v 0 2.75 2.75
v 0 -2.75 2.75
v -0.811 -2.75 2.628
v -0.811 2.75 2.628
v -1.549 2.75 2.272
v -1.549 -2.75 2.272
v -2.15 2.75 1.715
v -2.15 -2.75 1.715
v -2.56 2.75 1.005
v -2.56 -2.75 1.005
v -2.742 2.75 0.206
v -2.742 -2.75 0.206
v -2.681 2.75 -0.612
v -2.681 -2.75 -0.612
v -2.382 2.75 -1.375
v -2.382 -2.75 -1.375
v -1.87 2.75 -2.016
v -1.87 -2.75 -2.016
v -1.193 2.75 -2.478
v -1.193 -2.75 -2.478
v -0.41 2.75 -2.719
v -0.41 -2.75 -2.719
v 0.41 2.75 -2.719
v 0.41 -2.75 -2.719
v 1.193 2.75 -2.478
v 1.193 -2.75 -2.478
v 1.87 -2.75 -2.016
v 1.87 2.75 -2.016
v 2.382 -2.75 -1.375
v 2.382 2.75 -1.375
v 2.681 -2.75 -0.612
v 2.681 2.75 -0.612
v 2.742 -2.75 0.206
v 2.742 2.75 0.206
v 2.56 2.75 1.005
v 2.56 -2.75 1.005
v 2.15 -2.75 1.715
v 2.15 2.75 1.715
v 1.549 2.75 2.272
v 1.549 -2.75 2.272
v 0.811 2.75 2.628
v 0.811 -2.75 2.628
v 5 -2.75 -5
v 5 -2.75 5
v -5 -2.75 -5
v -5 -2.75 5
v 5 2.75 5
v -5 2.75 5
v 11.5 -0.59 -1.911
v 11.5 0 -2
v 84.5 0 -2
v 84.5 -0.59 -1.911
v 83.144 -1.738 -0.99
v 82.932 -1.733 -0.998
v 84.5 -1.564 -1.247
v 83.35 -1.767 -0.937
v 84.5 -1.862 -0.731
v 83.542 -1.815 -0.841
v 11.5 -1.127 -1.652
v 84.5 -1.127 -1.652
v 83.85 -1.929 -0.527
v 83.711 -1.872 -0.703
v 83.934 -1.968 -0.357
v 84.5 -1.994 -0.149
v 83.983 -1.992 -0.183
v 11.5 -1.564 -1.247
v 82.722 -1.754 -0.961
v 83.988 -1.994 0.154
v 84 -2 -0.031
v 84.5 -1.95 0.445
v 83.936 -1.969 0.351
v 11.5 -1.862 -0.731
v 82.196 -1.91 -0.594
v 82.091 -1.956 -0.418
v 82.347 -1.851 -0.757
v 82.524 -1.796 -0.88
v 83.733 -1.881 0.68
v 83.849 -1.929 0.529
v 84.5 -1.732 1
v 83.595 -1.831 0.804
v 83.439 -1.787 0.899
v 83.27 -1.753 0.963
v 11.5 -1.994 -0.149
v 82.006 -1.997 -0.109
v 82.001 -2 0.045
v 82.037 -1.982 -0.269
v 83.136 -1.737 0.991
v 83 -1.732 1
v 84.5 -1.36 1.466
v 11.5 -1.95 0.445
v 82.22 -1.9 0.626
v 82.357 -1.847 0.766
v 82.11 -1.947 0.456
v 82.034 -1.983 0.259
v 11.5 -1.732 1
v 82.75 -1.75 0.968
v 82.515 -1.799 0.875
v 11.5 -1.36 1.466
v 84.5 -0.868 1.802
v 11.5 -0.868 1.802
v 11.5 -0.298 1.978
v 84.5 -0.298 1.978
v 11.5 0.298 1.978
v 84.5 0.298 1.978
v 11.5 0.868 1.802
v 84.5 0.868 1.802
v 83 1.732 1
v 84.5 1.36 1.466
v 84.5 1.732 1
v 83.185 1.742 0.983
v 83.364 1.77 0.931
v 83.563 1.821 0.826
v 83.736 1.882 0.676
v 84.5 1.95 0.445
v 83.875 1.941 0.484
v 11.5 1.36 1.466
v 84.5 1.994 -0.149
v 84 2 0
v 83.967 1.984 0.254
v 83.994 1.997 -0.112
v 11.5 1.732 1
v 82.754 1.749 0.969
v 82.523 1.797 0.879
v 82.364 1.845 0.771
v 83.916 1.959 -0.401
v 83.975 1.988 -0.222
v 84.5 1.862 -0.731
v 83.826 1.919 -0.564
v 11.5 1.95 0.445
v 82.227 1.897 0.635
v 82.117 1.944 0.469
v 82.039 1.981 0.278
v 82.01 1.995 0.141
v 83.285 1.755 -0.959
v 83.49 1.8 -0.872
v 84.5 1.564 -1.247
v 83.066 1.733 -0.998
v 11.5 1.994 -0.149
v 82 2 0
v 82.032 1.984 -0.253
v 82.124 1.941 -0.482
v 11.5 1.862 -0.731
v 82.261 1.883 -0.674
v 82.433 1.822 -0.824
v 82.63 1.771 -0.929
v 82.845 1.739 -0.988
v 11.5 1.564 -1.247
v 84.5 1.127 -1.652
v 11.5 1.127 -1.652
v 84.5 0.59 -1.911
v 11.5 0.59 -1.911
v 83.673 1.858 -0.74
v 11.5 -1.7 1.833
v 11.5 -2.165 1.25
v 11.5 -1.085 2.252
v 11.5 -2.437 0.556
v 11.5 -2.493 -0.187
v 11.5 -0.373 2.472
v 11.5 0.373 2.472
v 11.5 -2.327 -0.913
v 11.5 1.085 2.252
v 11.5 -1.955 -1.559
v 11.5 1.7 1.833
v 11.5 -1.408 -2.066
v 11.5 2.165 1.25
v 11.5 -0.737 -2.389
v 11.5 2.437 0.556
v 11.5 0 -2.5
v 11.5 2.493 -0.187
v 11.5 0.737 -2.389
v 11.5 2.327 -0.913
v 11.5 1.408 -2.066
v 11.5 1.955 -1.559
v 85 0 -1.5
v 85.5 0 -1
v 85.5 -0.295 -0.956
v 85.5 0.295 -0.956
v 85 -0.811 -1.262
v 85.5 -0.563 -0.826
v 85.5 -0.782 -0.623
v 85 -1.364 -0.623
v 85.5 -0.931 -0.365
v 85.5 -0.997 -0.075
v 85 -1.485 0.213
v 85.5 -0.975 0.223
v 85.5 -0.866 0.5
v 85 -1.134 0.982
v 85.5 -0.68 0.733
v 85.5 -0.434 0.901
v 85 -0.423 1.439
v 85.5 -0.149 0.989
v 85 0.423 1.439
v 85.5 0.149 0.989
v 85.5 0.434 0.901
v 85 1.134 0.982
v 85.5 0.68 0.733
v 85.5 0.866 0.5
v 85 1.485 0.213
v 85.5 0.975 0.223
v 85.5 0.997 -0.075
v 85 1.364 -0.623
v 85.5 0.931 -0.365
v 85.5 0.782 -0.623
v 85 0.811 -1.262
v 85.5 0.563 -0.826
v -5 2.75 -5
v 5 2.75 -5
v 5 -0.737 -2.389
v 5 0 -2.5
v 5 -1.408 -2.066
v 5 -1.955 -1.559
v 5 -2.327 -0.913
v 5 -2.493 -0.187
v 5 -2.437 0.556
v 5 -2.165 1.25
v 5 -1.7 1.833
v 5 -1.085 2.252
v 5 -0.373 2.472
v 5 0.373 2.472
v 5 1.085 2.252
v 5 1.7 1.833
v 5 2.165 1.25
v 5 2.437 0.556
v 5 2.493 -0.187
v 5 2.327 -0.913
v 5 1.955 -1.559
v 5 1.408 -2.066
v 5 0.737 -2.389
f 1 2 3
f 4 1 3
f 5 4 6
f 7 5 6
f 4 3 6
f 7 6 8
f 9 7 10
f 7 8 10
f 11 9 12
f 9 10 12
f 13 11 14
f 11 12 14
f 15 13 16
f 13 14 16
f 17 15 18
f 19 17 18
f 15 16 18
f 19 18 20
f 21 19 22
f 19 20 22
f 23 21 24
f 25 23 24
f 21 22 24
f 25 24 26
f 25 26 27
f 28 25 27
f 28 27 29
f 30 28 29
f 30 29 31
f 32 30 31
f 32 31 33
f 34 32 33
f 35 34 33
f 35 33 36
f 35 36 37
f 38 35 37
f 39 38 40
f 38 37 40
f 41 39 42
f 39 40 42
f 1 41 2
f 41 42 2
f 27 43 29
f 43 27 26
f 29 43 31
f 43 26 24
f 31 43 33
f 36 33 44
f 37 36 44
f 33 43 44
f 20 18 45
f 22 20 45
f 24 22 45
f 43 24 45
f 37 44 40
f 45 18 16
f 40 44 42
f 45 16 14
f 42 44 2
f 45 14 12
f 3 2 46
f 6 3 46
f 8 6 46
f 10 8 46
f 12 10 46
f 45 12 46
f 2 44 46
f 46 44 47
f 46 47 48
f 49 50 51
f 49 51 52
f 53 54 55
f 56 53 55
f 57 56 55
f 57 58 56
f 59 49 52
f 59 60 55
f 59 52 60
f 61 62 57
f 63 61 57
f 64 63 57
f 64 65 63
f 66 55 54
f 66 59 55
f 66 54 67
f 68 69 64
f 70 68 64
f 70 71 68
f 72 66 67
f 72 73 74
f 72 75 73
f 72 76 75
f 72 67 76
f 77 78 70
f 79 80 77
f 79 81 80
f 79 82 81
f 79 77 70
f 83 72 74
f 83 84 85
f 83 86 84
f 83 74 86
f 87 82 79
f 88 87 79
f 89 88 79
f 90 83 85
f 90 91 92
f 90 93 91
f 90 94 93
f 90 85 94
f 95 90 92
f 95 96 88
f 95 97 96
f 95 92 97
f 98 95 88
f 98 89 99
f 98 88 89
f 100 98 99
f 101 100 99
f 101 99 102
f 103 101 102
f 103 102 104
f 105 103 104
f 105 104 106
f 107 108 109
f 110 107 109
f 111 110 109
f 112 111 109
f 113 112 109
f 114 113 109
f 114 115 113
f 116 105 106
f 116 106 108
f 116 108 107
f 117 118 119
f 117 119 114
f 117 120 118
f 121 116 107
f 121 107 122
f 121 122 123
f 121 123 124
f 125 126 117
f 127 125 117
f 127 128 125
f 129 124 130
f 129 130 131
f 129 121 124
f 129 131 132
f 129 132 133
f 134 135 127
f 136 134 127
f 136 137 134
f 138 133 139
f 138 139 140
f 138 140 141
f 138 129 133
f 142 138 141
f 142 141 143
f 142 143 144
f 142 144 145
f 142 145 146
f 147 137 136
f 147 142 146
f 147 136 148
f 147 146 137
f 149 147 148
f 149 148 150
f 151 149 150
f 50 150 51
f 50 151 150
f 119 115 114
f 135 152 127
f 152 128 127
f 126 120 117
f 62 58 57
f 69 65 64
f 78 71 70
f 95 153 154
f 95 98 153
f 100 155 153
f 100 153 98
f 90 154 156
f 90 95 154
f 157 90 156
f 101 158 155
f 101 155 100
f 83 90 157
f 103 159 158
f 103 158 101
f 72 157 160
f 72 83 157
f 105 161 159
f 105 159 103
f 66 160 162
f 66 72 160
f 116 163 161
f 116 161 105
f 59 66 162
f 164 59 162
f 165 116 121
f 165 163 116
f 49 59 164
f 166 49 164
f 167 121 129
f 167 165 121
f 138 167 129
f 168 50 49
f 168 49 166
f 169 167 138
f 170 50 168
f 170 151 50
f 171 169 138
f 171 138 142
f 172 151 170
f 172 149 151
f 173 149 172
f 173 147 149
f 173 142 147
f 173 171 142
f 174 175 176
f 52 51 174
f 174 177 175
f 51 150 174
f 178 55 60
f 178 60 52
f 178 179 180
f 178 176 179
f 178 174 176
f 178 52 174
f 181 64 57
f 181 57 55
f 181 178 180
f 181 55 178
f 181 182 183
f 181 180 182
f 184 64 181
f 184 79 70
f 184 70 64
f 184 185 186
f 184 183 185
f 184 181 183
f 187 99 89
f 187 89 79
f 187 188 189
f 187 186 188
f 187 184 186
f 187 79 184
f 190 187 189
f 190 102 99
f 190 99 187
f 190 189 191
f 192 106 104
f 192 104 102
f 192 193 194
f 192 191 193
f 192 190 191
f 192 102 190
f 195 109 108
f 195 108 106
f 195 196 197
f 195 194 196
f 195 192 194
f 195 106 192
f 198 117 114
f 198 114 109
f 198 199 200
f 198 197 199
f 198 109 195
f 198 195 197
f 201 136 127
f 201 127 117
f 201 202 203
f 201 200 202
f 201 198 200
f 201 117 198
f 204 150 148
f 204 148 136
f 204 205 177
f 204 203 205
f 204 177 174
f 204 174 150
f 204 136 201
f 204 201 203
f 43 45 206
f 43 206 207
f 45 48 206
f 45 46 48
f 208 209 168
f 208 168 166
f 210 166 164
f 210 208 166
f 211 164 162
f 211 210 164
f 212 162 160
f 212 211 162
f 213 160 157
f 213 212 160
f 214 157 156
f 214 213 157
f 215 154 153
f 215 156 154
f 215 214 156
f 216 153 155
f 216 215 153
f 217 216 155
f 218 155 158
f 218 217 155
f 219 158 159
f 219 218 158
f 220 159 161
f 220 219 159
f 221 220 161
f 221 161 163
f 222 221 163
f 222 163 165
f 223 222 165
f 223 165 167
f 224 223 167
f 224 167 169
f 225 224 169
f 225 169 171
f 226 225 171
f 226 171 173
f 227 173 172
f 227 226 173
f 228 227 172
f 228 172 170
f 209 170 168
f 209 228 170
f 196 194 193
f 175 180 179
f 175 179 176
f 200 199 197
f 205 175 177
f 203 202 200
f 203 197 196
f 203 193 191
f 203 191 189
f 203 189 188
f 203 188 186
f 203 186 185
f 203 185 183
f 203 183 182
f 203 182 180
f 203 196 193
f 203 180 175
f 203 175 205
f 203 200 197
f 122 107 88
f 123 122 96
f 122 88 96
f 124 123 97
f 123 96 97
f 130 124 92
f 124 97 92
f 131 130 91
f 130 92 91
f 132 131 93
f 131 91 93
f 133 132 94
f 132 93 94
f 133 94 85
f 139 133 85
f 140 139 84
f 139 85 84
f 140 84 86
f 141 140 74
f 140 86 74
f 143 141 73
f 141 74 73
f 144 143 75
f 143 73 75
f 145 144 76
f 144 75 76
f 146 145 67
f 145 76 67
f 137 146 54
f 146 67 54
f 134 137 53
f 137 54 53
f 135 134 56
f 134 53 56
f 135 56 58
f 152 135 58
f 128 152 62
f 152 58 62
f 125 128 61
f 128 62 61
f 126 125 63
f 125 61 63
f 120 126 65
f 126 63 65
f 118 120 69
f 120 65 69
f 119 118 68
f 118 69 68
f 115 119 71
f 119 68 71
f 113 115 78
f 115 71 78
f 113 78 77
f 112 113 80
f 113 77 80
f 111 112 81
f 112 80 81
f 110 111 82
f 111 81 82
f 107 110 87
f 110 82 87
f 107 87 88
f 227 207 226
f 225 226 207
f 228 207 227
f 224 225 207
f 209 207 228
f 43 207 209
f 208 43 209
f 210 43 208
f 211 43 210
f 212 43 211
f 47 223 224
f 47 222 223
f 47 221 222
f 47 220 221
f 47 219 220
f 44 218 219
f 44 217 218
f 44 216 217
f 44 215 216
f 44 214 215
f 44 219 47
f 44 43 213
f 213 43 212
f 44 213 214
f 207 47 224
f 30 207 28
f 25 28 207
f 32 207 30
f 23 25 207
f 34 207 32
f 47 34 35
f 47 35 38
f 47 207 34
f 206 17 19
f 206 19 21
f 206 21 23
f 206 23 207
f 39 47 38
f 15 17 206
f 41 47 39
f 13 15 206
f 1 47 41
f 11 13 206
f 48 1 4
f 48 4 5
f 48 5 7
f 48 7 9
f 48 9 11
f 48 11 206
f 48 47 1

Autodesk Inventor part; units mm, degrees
ref_plane "YZ Plane" through (0, 0, 0) normal (1, 0, 0) x (0, 1, 0)
ref_plane "XY Plane" through (0, 0, 0) normal (0, 0, 1) x (1, 0, 0)
sketch "Skizze1" plane through (0, 0, 0) normal (0, 1, 0) x (-1, 0, 0)
  line L0 (-5, 5) -> (5, 5)
  line L1 (5, 5) -> (5, -5)
  line L2 (5, -5) -> (-5, -5)
  line L3 (-5, -5) -> (-5, 5)
  line L4 (-5, 5) -> (5, -5) construction
  line L5 (5, 5) -> (-5, -5) construction
  point P0 (0, 0)
  dimension "d0" = 10
  dimension "d1" = 10
extrude "Extrusion1" add sketch "Skizze1" along normal mid plane 5.5
sketch "Skizze2" plane through (5, -2.75, -5) normal (1, 0, 0) x (0, 0, -1)
  circle A0 centre (-5, 2.75) radius 2.5
  dimension "d4" = 5
extrude "Extrusion2" add sketch "Skizze2" along normal blind 6.5
sketch "Skizze3" plane through (11.5, 0, 0) normal (1, 0, 0) x (0, 0, -1)
  circle A0 centre (0, 0) radius 2.5 projected
  circle A1 centre (0, 0) radius 2
  dimension "d7" = 4
extrude "Extrusion3" add sketch "Skizze3" along normal blind 74 contours A1
sketch "Skizze4" plane through (0, 2.75, 0) normal (0, 1, 0) x (1, 0, 0)
  point P0 (0, 0)
  point P1 (0, 0)
hole "Bohrung1" at (0, 2.75, 0) direction (0, -1, 0) diameter 5.5 depth 5.5
ref_plane "Arbeitsebene1" through (0, 2, 0) normal (0, 1, 0) x (-1, 0, 0)
sketch "Skizze5" plane through (0, 2, 0) normal (0, 1, 0) x (-1, 0, 0)
  line L0 (-85.5, 2) -> (-85.5, -2) projected
  point P0 (0, 0)
  point P1 (-83, 0)
  dimension "d18" = 2.5
hole "Bohrung2" at (83, 2, 0) direction (0, -1, 0) diameter 2 end through all
chamfer "Fasen1" distance 1 angle 45 1 edges at (85.5, 0, 2)
properties part number "BMS_24" material "Titan"
